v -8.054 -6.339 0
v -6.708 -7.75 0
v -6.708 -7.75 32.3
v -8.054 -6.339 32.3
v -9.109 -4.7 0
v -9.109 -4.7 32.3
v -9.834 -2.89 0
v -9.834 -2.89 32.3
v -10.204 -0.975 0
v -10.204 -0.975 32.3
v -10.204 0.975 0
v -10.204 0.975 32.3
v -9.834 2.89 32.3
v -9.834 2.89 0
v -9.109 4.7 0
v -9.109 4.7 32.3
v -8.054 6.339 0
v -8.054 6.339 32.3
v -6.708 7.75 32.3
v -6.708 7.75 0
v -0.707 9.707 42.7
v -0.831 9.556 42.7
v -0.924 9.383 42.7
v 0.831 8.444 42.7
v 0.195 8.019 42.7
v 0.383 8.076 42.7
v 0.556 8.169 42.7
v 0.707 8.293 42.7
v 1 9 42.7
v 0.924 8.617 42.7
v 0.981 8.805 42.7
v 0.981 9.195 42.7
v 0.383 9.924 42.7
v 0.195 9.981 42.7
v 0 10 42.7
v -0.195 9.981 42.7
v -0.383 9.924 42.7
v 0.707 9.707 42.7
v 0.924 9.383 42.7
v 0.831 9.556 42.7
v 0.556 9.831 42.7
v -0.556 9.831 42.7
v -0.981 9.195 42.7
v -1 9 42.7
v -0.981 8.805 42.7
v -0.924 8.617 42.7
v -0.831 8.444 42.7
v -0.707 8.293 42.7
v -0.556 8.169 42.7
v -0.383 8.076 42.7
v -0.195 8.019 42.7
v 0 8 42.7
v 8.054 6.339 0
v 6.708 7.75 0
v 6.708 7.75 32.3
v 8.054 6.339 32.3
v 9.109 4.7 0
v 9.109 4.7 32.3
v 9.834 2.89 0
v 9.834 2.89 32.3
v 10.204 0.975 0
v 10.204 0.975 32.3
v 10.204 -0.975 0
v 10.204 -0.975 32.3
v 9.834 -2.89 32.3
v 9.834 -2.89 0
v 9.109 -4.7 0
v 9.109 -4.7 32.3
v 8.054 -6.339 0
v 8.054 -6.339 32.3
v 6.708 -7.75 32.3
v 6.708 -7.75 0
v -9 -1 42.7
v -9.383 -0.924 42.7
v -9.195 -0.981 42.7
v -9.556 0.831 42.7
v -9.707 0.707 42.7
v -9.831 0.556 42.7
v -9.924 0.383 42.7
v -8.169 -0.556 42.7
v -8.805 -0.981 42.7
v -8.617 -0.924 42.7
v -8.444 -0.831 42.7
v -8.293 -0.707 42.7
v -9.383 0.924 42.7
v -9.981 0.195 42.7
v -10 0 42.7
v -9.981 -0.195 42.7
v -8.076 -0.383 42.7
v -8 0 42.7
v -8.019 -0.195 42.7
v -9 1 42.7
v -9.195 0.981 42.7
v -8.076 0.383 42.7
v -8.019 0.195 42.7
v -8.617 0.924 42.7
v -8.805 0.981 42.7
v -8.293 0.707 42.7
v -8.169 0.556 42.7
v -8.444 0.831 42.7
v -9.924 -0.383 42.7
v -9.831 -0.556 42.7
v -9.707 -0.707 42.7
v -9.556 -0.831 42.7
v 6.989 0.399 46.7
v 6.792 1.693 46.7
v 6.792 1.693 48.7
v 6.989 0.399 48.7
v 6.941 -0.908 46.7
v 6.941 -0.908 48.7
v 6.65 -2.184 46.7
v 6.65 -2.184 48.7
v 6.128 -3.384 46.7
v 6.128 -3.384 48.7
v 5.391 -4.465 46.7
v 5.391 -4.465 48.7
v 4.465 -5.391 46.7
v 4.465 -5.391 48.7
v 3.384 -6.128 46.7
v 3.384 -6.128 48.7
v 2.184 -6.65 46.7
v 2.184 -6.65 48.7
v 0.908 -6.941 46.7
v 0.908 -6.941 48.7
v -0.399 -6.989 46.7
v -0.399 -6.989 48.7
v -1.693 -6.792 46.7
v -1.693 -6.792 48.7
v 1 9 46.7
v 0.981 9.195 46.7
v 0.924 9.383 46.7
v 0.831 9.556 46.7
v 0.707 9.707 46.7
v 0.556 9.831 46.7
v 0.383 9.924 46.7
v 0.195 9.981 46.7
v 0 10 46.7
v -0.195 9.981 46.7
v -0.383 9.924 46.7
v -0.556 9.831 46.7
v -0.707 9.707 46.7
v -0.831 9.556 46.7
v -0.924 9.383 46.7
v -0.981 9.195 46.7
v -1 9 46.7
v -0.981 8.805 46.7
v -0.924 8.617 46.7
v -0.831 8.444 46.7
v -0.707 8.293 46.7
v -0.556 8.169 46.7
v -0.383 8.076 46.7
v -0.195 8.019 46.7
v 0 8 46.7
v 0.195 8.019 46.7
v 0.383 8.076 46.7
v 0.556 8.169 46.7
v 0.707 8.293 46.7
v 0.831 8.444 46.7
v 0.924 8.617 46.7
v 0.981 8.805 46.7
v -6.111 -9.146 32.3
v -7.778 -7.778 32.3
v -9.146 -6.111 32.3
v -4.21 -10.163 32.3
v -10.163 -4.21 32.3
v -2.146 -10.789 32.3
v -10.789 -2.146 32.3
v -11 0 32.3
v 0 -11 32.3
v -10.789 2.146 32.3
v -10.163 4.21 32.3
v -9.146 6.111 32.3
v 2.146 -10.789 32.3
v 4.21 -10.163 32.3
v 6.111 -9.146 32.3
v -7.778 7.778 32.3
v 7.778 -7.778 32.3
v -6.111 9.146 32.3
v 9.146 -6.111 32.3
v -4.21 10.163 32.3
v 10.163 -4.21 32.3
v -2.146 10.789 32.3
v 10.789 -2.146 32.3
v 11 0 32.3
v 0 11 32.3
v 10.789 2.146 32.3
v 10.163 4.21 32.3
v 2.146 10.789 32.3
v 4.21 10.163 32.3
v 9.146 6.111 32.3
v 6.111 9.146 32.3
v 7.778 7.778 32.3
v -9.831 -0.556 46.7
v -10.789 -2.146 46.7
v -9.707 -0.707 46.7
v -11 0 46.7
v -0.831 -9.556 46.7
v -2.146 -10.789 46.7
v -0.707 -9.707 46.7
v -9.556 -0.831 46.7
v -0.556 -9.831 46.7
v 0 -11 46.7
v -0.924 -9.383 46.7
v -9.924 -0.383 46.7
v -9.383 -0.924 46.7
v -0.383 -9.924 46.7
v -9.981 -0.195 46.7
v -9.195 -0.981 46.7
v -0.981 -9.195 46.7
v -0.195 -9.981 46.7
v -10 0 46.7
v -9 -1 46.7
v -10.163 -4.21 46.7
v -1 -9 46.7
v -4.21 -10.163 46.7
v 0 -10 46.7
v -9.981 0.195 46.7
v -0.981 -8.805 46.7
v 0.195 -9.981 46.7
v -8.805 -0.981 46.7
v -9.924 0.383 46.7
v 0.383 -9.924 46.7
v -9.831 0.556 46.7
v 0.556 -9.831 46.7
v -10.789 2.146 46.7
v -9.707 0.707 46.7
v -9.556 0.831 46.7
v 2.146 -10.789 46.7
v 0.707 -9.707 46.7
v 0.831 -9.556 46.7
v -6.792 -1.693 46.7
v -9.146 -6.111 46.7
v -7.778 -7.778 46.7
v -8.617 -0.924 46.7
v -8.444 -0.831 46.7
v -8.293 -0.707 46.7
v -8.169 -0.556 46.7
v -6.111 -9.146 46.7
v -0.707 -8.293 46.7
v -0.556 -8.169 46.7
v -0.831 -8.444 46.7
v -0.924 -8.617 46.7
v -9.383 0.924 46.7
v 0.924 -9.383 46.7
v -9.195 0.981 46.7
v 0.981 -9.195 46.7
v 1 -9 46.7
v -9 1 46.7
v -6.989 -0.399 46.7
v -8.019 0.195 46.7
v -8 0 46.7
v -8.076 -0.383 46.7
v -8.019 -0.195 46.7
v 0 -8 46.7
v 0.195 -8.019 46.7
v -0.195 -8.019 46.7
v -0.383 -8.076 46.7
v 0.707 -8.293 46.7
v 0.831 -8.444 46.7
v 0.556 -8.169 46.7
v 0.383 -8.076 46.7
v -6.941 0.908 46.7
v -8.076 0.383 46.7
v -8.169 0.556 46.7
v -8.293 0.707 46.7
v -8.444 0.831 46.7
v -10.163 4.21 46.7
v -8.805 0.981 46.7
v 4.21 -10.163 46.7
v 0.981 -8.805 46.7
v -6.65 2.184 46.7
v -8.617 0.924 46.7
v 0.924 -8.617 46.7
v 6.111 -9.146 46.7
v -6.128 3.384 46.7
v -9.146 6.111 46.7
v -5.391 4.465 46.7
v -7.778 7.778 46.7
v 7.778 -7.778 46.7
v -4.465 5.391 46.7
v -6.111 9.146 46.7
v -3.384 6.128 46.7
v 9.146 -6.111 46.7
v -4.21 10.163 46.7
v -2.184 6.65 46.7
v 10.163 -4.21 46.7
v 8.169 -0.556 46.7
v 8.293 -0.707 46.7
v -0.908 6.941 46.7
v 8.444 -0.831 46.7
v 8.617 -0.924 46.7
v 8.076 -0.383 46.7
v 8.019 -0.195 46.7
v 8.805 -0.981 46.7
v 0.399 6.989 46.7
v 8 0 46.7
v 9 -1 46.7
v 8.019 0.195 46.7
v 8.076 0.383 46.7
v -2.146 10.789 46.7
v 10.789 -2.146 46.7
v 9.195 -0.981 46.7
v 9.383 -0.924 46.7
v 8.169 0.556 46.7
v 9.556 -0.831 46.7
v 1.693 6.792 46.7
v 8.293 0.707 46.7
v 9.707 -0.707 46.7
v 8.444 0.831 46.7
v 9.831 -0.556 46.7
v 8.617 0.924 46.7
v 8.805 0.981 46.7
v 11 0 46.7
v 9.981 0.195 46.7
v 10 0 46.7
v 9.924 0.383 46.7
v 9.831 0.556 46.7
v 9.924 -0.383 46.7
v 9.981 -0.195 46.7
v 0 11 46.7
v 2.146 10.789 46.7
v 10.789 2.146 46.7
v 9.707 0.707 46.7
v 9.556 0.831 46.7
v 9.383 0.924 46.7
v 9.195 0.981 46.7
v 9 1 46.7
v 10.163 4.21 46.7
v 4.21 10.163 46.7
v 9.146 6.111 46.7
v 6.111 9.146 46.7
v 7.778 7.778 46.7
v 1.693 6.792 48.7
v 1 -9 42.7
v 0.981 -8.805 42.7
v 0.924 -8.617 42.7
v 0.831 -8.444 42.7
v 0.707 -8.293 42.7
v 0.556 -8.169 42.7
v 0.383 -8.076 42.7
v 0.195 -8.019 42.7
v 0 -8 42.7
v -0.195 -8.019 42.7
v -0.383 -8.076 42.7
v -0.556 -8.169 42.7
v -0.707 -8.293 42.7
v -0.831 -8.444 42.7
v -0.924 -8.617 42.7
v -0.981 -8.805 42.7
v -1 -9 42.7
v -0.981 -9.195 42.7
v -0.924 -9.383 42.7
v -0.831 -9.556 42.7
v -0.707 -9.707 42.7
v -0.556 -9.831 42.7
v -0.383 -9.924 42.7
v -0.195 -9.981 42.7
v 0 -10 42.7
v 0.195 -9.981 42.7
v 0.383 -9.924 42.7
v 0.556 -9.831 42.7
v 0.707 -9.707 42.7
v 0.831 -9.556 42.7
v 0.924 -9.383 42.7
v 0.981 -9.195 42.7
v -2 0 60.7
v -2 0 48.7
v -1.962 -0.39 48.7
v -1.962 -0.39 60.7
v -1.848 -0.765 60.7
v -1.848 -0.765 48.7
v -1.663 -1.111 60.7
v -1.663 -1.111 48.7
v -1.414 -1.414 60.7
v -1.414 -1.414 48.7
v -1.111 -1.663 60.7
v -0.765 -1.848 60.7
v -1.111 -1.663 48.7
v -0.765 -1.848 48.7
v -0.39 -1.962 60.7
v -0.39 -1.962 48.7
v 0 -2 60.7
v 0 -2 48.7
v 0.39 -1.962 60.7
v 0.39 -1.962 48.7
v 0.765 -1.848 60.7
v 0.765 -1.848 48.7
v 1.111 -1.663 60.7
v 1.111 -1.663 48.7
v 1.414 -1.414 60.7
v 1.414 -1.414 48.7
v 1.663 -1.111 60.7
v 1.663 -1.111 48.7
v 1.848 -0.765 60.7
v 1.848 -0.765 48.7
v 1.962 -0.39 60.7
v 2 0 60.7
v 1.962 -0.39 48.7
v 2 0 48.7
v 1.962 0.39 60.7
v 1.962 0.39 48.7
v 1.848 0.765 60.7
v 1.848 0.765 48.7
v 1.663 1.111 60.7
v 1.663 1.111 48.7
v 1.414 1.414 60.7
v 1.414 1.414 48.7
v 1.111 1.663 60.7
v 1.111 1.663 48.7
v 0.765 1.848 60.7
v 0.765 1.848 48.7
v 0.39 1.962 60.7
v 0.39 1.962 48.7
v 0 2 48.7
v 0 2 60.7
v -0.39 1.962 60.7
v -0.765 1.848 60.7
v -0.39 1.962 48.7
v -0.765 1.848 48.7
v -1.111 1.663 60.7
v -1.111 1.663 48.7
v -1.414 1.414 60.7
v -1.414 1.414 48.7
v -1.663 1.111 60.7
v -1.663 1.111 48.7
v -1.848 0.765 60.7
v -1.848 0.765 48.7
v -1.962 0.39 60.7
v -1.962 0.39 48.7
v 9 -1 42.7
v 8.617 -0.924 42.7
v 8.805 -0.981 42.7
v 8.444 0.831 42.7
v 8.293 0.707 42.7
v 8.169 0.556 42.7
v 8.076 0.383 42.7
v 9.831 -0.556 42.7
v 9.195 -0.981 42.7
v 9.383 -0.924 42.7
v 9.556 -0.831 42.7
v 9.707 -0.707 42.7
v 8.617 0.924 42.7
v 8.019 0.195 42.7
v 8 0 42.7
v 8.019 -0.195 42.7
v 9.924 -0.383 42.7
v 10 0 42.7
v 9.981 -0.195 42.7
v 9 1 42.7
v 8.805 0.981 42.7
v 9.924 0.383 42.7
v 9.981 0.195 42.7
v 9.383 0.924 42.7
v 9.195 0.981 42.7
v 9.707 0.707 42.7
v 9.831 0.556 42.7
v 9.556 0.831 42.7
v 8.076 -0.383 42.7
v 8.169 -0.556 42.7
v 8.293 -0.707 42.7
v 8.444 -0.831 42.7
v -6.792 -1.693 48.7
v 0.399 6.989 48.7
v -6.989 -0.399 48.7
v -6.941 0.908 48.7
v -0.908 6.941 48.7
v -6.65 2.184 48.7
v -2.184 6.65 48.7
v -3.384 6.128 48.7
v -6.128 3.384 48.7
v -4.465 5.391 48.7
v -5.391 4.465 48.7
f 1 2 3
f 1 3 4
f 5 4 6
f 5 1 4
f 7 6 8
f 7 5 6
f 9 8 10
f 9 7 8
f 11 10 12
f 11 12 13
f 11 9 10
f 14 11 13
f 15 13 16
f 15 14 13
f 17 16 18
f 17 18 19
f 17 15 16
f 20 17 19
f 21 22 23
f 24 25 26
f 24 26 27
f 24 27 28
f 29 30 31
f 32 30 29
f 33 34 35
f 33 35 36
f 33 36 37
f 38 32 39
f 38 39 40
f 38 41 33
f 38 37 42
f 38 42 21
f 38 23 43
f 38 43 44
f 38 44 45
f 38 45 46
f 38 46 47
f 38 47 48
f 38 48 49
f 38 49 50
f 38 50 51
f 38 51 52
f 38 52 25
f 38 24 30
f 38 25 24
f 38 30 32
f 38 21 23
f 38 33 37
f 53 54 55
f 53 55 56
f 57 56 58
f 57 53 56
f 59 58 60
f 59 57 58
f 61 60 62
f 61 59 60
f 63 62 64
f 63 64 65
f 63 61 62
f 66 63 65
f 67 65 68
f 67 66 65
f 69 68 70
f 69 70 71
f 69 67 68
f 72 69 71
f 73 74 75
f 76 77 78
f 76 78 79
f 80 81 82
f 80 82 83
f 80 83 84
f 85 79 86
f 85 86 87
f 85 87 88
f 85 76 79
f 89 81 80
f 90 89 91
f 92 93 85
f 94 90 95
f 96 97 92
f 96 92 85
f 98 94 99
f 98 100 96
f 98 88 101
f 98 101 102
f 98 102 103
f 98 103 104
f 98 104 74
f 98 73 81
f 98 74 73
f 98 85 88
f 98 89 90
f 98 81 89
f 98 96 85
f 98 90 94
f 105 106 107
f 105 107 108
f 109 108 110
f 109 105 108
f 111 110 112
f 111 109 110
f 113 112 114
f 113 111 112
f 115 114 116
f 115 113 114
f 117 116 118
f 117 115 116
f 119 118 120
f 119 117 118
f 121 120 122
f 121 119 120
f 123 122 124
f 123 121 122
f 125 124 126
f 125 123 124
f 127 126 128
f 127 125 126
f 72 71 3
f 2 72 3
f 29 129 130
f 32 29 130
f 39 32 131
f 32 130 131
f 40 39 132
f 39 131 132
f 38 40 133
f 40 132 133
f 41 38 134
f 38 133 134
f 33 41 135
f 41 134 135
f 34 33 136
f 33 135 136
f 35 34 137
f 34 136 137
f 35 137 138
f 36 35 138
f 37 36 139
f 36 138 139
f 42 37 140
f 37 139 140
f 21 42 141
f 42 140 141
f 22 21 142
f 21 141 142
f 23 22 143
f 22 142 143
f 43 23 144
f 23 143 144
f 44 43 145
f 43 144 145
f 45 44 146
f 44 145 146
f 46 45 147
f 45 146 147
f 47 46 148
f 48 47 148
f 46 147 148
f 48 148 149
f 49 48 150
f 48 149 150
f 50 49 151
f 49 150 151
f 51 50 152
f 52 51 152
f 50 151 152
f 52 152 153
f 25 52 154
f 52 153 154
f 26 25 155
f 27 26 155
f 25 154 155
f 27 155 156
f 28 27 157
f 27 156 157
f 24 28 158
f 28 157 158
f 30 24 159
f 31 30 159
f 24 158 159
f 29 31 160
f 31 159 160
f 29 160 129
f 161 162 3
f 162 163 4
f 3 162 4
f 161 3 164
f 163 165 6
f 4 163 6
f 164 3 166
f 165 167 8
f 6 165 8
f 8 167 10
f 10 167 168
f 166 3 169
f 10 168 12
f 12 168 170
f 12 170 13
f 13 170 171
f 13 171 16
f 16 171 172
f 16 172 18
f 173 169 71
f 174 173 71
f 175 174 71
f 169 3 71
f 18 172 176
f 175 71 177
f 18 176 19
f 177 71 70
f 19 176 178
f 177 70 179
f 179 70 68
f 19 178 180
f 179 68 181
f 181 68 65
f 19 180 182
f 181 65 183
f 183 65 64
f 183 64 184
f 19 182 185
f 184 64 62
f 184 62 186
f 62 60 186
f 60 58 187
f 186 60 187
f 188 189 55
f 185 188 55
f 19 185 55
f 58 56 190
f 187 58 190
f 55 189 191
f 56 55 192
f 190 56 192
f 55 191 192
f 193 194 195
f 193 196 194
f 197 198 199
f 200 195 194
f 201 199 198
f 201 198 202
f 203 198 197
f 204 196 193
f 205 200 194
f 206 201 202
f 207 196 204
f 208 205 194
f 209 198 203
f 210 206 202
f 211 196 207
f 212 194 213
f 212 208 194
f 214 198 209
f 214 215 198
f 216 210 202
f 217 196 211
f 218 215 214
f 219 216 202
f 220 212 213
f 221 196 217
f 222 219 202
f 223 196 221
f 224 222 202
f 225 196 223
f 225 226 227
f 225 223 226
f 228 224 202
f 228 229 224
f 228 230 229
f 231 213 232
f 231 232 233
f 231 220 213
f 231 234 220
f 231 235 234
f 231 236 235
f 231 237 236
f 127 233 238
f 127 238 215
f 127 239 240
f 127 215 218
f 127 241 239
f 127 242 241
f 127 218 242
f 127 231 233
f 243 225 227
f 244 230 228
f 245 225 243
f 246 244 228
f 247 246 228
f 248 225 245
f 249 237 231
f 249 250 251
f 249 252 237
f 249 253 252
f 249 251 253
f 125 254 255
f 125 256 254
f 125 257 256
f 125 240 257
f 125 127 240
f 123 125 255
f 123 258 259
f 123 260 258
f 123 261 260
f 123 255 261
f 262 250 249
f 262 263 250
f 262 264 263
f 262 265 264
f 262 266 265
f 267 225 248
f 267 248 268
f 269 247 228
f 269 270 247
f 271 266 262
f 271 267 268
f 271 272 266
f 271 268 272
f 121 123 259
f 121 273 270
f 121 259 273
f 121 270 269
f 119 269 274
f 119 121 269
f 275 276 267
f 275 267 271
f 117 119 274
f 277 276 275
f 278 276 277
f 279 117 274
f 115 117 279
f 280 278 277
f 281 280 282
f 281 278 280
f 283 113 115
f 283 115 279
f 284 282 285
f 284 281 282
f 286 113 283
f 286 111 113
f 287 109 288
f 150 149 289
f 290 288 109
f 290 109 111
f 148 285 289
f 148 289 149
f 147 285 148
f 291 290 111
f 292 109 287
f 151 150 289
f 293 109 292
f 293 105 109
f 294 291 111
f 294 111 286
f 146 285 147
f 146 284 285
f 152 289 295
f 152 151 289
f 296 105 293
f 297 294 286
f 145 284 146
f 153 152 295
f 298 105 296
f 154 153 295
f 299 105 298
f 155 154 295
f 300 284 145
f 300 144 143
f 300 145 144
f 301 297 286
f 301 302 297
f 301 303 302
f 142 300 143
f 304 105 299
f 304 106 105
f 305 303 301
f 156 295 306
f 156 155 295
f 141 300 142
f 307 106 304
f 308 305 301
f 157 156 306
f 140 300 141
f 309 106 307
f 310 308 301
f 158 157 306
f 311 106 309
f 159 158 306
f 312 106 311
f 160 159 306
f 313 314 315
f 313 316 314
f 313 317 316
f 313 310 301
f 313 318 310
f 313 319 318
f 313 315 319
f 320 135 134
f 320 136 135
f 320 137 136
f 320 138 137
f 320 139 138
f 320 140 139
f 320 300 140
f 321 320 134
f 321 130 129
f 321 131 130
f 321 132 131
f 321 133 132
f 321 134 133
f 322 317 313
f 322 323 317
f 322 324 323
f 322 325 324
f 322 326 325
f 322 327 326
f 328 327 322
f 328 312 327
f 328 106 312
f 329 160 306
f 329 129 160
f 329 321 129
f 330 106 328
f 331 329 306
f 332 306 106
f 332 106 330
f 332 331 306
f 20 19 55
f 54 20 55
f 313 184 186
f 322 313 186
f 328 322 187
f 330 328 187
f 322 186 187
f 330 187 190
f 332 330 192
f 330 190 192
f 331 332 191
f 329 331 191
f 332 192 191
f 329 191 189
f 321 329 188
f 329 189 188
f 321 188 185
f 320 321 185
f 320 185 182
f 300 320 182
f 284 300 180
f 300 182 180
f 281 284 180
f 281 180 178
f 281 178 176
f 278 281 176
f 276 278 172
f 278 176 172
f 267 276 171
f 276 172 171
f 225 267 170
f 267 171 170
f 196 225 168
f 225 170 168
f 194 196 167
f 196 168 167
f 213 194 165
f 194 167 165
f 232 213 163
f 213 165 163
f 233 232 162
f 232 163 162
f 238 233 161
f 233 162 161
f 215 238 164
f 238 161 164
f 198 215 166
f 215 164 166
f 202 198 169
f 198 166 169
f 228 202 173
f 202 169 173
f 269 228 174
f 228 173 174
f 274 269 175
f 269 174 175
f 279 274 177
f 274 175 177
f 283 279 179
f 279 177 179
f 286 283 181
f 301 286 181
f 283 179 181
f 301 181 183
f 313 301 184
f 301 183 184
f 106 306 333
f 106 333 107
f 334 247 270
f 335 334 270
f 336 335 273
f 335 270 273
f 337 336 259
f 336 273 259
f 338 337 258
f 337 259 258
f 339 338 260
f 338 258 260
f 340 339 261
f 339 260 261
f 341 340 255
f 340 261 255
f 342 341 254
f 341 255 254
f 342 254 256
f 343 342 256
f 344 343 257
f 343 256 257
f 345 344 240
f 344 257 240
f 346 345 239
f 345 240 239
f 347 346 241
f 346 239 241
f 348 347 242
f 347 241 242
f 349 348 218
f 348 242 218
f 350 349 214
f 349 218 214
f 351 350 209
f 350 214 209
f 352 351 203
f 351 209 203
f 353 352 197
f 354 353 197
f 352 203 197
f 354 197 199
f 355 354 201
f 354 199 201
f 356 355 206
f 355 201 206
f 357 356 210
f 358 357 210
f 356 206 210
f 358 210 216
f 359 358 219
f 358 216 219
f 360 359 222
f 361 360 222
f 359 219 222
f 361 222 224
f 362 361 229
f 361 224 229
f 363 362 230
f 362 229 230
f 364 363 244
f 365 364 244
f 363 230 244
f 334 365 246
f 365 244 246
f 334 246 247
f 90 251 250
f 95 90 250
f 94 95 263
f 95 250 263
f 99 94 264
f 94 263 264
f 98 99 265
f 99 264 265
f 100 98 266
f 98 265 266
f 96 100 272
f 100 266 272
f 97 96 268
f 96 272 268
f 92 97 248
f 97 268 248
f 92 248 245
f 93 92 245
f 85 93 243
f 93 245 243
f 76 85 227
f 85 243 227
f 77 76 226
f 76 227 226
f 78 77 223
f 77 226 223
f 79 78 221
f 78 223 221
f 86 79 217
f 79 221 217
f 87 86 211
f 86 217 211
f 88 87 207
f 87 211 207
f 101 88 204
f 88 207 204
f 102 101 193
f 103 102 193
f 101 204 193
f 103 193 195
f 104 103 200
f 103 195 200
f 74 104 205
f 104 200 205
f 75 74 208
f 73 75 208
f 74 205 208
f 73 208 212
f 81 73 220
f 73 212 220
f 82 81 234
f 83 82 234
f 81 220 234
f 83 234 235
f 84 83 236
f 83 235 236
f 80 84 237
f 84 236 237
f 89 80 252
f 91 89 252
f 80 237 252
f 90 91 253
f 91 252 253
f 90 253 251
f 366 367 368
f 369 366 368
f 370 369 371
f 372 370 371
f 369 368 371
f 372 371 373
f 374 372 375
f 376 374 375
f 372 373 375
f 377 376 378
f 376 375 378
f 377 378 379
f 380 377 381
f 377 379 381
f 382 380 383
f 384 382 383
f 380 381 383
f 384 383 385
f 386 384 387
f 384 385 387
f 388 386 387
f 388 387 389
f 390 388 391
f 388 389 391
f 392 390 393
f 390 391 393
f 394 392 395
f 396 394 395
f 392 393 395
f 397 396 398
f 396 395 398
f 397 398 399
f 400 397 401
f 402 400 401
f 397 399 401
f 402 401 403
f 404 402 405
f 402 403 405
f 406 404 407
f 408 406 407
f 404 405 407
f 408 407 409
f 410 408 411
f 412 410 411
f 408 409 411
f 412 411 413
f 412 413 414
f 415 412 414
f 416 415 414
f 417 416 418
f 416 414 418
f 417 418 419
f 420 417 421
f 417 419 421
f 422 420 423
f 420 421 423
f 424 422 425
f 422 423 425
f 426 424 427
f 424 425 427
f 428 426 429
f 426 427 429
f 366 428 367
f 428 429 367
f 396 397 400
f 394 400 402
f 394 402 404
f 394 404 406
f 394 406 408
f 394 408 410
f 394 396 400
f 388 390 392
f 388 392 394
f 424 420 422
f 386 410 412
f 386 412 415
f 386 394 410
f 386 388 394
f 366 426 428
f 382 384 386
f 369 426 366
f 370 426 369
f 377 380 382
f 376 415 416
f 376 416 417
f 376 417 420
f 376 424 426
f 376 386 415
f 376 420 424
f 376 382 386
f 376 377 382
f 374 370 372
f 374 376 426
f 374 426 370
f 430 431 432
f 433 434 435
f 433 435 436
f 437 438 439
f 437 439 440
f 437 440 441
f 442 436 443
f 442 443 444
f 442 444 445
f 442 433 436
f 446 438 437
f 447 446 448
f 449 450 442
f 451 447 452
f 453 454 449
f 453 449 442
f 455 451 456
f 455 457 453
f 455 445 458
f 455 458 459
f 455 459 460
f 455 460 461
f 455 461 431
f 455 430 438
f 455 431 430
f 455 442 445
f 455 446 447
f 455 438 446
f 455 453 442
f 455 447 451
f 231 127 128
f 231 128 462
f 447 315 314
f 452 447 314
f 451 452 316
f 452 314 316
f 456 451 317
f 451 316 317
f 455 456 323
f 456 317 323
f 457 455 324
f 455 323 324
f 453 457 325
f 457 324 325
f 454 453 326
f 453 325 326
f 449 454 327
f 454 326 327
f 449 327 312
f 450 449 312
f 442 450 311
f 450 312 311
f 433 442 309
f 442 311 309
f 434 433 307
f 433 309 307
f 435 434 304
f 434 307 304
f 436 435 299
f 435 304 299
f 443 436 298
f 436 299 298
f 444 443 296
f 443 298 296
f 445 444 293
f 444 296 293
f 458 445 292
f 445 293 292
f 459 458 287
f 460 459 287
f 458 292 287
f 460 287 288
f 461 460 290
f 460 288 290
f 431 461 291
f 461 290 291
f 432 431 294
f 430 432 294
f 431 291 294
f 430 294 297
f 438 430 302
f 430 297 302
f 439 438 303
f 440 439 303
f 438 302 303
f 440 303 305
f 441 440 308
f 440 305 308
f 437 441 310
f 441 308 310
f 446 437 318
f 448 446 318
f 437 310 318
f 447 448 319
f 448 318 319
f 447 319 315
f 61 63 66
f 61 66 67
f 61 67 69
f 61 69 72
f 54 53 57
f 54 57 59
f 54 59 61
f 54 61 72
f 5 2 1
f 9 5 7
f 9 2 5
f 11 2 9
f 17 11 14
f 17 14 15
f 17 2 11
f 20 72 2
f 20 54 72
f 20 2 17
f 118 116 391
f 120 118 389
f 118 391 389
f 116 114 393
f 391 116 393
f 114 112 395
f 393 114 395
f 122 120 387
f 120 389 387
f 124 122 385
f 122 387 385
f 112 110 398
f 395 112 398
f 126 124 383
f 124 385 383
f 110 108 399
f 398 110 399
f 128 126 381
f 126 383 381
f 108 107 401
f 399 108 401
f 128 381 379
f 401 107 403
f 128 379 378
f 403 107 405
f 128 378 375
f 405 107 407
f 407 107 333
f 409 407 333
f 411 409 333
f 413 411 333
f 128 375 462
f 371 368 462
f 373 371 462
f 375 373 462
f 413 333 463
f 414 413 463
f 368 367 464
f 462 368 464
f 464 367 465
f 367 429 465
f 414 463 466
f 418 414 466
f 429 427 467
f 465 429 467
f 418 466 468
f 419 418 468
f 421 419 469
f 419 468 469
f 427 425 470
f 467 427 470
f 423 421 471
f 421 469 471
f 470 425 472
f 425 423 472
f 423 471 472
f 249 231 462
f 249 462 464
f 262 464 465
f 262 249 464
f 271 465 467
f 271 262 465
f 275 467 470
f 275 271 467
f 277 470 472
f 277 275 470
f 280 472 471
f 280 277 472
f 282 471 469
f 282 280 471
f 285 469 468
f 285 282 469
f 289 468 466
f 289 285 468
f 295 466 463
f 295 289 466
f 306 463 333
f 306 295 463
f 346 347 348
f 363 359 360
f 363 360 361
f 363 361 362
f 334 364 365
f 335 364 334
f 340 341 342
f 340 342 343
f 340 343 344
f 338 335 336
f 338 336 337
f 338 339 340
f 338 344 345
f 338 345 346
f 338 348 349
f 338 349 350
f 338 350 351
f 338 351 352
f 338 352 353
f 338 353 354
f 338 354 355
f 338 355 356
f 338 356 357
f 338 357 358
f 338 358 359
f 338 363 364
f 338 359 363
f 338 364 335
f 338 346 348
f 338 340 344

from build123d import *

# Parameters (mm, degrees)
BOSS_EXTRU_1_DEPTH      = 32.3
ESQUISSE2_R             = 11
BOSS_EXTRU_2_DEPTH      = 14.4
BOSS_EXTRU_3_DEPTH      = 2
ESQUISSE5_R             = 2
BOSS_EXTRU_4_DEPTH      = 12
ESQUISSE6_R             = 1
ENL_V_MAT_EXTRU_1_DEPTH = 4


with BuildPart() as part:
    # Esquisse1 → Boss.-Extru.1 (new body)
    with BuildSketch(Plane.XY):
        with BuildLine():
            Line((6.708203932, -7.75), (-6.708203932, -7.75))
            ThreePointArc((-6.708203932, -7.75), (-10.25, 0), (-6.708203932, 7.75))
            Line((-6.708203932, 7.75), (6.708203932, 7.75))
            ThreePointArc((6.708203932, 7.75), (10.25, 0), (6.708203932, -7.75))
        make_face()
    extrude(amount=BOSS_EXTRU_1_DEPTH)

    # Esquisse2 → Boss.-Extru.2 (add)
    with BuildSketch(Plane.XY.offset(32.3)):
        Circle(ESQUISSE2_R)
    extrude(amount=BOSS_EXTRU_2_DEPTH)

    # Esquisse4 → Boss.-Extru.3 (add)
    with BuildSketch(Plane.XY.offset(46.7)):
        with BuildLine():
            Line((-1.69313093, -6.792150444), (-6.792150444, -1.69313093))
            ThreePointArc((-6.792150444, -1.69313093), (-4.949747468, 4.949747468), (1.69313093, 6.792150444))
            Line((1.69313093, 6.792150444), (6.792150444, 1.69313093))
            ThreePointArc((6.792150444, 1.69313093), (4.949747468, -4.949747468), (-1.69313093, -6.792150444))
        make_face()
    extrude(amount=BOSS_EXTRU_3_DEPTH)

    # Esquisse5 → Boss.-Extru.4 (add)
    with BuildSketch(Plane.XY.offset(48.7)):
        with Locations(Location((0, 0, 0), (0, 0, 180))):
            Circle(ESQUISSE5_R)
    extrude(amount=BOSS_EXTRU_4_DEPTH)

    # Esquisse6 → Enlèv. mat.-Extru.1 (cut)
    with BuildSketch(Plane.XY.offset(46.7)):
        with Locations((-9, 0)):
            Circle(ESQUISSE6_R)
        with Locations((0, 9)):
            Circle(ESQUISSE6_R)
        with Locations((9, 0)):
            Circle(ESQUISSE6_R)
        with Locations((0, -9)):
            Circle(ESQUISSE6_R)
    extrude(amount=-ENL_V_MAT_EXTRU_1_DEPTH, mode=Mode.SUBTRACT)


solid = part.part
